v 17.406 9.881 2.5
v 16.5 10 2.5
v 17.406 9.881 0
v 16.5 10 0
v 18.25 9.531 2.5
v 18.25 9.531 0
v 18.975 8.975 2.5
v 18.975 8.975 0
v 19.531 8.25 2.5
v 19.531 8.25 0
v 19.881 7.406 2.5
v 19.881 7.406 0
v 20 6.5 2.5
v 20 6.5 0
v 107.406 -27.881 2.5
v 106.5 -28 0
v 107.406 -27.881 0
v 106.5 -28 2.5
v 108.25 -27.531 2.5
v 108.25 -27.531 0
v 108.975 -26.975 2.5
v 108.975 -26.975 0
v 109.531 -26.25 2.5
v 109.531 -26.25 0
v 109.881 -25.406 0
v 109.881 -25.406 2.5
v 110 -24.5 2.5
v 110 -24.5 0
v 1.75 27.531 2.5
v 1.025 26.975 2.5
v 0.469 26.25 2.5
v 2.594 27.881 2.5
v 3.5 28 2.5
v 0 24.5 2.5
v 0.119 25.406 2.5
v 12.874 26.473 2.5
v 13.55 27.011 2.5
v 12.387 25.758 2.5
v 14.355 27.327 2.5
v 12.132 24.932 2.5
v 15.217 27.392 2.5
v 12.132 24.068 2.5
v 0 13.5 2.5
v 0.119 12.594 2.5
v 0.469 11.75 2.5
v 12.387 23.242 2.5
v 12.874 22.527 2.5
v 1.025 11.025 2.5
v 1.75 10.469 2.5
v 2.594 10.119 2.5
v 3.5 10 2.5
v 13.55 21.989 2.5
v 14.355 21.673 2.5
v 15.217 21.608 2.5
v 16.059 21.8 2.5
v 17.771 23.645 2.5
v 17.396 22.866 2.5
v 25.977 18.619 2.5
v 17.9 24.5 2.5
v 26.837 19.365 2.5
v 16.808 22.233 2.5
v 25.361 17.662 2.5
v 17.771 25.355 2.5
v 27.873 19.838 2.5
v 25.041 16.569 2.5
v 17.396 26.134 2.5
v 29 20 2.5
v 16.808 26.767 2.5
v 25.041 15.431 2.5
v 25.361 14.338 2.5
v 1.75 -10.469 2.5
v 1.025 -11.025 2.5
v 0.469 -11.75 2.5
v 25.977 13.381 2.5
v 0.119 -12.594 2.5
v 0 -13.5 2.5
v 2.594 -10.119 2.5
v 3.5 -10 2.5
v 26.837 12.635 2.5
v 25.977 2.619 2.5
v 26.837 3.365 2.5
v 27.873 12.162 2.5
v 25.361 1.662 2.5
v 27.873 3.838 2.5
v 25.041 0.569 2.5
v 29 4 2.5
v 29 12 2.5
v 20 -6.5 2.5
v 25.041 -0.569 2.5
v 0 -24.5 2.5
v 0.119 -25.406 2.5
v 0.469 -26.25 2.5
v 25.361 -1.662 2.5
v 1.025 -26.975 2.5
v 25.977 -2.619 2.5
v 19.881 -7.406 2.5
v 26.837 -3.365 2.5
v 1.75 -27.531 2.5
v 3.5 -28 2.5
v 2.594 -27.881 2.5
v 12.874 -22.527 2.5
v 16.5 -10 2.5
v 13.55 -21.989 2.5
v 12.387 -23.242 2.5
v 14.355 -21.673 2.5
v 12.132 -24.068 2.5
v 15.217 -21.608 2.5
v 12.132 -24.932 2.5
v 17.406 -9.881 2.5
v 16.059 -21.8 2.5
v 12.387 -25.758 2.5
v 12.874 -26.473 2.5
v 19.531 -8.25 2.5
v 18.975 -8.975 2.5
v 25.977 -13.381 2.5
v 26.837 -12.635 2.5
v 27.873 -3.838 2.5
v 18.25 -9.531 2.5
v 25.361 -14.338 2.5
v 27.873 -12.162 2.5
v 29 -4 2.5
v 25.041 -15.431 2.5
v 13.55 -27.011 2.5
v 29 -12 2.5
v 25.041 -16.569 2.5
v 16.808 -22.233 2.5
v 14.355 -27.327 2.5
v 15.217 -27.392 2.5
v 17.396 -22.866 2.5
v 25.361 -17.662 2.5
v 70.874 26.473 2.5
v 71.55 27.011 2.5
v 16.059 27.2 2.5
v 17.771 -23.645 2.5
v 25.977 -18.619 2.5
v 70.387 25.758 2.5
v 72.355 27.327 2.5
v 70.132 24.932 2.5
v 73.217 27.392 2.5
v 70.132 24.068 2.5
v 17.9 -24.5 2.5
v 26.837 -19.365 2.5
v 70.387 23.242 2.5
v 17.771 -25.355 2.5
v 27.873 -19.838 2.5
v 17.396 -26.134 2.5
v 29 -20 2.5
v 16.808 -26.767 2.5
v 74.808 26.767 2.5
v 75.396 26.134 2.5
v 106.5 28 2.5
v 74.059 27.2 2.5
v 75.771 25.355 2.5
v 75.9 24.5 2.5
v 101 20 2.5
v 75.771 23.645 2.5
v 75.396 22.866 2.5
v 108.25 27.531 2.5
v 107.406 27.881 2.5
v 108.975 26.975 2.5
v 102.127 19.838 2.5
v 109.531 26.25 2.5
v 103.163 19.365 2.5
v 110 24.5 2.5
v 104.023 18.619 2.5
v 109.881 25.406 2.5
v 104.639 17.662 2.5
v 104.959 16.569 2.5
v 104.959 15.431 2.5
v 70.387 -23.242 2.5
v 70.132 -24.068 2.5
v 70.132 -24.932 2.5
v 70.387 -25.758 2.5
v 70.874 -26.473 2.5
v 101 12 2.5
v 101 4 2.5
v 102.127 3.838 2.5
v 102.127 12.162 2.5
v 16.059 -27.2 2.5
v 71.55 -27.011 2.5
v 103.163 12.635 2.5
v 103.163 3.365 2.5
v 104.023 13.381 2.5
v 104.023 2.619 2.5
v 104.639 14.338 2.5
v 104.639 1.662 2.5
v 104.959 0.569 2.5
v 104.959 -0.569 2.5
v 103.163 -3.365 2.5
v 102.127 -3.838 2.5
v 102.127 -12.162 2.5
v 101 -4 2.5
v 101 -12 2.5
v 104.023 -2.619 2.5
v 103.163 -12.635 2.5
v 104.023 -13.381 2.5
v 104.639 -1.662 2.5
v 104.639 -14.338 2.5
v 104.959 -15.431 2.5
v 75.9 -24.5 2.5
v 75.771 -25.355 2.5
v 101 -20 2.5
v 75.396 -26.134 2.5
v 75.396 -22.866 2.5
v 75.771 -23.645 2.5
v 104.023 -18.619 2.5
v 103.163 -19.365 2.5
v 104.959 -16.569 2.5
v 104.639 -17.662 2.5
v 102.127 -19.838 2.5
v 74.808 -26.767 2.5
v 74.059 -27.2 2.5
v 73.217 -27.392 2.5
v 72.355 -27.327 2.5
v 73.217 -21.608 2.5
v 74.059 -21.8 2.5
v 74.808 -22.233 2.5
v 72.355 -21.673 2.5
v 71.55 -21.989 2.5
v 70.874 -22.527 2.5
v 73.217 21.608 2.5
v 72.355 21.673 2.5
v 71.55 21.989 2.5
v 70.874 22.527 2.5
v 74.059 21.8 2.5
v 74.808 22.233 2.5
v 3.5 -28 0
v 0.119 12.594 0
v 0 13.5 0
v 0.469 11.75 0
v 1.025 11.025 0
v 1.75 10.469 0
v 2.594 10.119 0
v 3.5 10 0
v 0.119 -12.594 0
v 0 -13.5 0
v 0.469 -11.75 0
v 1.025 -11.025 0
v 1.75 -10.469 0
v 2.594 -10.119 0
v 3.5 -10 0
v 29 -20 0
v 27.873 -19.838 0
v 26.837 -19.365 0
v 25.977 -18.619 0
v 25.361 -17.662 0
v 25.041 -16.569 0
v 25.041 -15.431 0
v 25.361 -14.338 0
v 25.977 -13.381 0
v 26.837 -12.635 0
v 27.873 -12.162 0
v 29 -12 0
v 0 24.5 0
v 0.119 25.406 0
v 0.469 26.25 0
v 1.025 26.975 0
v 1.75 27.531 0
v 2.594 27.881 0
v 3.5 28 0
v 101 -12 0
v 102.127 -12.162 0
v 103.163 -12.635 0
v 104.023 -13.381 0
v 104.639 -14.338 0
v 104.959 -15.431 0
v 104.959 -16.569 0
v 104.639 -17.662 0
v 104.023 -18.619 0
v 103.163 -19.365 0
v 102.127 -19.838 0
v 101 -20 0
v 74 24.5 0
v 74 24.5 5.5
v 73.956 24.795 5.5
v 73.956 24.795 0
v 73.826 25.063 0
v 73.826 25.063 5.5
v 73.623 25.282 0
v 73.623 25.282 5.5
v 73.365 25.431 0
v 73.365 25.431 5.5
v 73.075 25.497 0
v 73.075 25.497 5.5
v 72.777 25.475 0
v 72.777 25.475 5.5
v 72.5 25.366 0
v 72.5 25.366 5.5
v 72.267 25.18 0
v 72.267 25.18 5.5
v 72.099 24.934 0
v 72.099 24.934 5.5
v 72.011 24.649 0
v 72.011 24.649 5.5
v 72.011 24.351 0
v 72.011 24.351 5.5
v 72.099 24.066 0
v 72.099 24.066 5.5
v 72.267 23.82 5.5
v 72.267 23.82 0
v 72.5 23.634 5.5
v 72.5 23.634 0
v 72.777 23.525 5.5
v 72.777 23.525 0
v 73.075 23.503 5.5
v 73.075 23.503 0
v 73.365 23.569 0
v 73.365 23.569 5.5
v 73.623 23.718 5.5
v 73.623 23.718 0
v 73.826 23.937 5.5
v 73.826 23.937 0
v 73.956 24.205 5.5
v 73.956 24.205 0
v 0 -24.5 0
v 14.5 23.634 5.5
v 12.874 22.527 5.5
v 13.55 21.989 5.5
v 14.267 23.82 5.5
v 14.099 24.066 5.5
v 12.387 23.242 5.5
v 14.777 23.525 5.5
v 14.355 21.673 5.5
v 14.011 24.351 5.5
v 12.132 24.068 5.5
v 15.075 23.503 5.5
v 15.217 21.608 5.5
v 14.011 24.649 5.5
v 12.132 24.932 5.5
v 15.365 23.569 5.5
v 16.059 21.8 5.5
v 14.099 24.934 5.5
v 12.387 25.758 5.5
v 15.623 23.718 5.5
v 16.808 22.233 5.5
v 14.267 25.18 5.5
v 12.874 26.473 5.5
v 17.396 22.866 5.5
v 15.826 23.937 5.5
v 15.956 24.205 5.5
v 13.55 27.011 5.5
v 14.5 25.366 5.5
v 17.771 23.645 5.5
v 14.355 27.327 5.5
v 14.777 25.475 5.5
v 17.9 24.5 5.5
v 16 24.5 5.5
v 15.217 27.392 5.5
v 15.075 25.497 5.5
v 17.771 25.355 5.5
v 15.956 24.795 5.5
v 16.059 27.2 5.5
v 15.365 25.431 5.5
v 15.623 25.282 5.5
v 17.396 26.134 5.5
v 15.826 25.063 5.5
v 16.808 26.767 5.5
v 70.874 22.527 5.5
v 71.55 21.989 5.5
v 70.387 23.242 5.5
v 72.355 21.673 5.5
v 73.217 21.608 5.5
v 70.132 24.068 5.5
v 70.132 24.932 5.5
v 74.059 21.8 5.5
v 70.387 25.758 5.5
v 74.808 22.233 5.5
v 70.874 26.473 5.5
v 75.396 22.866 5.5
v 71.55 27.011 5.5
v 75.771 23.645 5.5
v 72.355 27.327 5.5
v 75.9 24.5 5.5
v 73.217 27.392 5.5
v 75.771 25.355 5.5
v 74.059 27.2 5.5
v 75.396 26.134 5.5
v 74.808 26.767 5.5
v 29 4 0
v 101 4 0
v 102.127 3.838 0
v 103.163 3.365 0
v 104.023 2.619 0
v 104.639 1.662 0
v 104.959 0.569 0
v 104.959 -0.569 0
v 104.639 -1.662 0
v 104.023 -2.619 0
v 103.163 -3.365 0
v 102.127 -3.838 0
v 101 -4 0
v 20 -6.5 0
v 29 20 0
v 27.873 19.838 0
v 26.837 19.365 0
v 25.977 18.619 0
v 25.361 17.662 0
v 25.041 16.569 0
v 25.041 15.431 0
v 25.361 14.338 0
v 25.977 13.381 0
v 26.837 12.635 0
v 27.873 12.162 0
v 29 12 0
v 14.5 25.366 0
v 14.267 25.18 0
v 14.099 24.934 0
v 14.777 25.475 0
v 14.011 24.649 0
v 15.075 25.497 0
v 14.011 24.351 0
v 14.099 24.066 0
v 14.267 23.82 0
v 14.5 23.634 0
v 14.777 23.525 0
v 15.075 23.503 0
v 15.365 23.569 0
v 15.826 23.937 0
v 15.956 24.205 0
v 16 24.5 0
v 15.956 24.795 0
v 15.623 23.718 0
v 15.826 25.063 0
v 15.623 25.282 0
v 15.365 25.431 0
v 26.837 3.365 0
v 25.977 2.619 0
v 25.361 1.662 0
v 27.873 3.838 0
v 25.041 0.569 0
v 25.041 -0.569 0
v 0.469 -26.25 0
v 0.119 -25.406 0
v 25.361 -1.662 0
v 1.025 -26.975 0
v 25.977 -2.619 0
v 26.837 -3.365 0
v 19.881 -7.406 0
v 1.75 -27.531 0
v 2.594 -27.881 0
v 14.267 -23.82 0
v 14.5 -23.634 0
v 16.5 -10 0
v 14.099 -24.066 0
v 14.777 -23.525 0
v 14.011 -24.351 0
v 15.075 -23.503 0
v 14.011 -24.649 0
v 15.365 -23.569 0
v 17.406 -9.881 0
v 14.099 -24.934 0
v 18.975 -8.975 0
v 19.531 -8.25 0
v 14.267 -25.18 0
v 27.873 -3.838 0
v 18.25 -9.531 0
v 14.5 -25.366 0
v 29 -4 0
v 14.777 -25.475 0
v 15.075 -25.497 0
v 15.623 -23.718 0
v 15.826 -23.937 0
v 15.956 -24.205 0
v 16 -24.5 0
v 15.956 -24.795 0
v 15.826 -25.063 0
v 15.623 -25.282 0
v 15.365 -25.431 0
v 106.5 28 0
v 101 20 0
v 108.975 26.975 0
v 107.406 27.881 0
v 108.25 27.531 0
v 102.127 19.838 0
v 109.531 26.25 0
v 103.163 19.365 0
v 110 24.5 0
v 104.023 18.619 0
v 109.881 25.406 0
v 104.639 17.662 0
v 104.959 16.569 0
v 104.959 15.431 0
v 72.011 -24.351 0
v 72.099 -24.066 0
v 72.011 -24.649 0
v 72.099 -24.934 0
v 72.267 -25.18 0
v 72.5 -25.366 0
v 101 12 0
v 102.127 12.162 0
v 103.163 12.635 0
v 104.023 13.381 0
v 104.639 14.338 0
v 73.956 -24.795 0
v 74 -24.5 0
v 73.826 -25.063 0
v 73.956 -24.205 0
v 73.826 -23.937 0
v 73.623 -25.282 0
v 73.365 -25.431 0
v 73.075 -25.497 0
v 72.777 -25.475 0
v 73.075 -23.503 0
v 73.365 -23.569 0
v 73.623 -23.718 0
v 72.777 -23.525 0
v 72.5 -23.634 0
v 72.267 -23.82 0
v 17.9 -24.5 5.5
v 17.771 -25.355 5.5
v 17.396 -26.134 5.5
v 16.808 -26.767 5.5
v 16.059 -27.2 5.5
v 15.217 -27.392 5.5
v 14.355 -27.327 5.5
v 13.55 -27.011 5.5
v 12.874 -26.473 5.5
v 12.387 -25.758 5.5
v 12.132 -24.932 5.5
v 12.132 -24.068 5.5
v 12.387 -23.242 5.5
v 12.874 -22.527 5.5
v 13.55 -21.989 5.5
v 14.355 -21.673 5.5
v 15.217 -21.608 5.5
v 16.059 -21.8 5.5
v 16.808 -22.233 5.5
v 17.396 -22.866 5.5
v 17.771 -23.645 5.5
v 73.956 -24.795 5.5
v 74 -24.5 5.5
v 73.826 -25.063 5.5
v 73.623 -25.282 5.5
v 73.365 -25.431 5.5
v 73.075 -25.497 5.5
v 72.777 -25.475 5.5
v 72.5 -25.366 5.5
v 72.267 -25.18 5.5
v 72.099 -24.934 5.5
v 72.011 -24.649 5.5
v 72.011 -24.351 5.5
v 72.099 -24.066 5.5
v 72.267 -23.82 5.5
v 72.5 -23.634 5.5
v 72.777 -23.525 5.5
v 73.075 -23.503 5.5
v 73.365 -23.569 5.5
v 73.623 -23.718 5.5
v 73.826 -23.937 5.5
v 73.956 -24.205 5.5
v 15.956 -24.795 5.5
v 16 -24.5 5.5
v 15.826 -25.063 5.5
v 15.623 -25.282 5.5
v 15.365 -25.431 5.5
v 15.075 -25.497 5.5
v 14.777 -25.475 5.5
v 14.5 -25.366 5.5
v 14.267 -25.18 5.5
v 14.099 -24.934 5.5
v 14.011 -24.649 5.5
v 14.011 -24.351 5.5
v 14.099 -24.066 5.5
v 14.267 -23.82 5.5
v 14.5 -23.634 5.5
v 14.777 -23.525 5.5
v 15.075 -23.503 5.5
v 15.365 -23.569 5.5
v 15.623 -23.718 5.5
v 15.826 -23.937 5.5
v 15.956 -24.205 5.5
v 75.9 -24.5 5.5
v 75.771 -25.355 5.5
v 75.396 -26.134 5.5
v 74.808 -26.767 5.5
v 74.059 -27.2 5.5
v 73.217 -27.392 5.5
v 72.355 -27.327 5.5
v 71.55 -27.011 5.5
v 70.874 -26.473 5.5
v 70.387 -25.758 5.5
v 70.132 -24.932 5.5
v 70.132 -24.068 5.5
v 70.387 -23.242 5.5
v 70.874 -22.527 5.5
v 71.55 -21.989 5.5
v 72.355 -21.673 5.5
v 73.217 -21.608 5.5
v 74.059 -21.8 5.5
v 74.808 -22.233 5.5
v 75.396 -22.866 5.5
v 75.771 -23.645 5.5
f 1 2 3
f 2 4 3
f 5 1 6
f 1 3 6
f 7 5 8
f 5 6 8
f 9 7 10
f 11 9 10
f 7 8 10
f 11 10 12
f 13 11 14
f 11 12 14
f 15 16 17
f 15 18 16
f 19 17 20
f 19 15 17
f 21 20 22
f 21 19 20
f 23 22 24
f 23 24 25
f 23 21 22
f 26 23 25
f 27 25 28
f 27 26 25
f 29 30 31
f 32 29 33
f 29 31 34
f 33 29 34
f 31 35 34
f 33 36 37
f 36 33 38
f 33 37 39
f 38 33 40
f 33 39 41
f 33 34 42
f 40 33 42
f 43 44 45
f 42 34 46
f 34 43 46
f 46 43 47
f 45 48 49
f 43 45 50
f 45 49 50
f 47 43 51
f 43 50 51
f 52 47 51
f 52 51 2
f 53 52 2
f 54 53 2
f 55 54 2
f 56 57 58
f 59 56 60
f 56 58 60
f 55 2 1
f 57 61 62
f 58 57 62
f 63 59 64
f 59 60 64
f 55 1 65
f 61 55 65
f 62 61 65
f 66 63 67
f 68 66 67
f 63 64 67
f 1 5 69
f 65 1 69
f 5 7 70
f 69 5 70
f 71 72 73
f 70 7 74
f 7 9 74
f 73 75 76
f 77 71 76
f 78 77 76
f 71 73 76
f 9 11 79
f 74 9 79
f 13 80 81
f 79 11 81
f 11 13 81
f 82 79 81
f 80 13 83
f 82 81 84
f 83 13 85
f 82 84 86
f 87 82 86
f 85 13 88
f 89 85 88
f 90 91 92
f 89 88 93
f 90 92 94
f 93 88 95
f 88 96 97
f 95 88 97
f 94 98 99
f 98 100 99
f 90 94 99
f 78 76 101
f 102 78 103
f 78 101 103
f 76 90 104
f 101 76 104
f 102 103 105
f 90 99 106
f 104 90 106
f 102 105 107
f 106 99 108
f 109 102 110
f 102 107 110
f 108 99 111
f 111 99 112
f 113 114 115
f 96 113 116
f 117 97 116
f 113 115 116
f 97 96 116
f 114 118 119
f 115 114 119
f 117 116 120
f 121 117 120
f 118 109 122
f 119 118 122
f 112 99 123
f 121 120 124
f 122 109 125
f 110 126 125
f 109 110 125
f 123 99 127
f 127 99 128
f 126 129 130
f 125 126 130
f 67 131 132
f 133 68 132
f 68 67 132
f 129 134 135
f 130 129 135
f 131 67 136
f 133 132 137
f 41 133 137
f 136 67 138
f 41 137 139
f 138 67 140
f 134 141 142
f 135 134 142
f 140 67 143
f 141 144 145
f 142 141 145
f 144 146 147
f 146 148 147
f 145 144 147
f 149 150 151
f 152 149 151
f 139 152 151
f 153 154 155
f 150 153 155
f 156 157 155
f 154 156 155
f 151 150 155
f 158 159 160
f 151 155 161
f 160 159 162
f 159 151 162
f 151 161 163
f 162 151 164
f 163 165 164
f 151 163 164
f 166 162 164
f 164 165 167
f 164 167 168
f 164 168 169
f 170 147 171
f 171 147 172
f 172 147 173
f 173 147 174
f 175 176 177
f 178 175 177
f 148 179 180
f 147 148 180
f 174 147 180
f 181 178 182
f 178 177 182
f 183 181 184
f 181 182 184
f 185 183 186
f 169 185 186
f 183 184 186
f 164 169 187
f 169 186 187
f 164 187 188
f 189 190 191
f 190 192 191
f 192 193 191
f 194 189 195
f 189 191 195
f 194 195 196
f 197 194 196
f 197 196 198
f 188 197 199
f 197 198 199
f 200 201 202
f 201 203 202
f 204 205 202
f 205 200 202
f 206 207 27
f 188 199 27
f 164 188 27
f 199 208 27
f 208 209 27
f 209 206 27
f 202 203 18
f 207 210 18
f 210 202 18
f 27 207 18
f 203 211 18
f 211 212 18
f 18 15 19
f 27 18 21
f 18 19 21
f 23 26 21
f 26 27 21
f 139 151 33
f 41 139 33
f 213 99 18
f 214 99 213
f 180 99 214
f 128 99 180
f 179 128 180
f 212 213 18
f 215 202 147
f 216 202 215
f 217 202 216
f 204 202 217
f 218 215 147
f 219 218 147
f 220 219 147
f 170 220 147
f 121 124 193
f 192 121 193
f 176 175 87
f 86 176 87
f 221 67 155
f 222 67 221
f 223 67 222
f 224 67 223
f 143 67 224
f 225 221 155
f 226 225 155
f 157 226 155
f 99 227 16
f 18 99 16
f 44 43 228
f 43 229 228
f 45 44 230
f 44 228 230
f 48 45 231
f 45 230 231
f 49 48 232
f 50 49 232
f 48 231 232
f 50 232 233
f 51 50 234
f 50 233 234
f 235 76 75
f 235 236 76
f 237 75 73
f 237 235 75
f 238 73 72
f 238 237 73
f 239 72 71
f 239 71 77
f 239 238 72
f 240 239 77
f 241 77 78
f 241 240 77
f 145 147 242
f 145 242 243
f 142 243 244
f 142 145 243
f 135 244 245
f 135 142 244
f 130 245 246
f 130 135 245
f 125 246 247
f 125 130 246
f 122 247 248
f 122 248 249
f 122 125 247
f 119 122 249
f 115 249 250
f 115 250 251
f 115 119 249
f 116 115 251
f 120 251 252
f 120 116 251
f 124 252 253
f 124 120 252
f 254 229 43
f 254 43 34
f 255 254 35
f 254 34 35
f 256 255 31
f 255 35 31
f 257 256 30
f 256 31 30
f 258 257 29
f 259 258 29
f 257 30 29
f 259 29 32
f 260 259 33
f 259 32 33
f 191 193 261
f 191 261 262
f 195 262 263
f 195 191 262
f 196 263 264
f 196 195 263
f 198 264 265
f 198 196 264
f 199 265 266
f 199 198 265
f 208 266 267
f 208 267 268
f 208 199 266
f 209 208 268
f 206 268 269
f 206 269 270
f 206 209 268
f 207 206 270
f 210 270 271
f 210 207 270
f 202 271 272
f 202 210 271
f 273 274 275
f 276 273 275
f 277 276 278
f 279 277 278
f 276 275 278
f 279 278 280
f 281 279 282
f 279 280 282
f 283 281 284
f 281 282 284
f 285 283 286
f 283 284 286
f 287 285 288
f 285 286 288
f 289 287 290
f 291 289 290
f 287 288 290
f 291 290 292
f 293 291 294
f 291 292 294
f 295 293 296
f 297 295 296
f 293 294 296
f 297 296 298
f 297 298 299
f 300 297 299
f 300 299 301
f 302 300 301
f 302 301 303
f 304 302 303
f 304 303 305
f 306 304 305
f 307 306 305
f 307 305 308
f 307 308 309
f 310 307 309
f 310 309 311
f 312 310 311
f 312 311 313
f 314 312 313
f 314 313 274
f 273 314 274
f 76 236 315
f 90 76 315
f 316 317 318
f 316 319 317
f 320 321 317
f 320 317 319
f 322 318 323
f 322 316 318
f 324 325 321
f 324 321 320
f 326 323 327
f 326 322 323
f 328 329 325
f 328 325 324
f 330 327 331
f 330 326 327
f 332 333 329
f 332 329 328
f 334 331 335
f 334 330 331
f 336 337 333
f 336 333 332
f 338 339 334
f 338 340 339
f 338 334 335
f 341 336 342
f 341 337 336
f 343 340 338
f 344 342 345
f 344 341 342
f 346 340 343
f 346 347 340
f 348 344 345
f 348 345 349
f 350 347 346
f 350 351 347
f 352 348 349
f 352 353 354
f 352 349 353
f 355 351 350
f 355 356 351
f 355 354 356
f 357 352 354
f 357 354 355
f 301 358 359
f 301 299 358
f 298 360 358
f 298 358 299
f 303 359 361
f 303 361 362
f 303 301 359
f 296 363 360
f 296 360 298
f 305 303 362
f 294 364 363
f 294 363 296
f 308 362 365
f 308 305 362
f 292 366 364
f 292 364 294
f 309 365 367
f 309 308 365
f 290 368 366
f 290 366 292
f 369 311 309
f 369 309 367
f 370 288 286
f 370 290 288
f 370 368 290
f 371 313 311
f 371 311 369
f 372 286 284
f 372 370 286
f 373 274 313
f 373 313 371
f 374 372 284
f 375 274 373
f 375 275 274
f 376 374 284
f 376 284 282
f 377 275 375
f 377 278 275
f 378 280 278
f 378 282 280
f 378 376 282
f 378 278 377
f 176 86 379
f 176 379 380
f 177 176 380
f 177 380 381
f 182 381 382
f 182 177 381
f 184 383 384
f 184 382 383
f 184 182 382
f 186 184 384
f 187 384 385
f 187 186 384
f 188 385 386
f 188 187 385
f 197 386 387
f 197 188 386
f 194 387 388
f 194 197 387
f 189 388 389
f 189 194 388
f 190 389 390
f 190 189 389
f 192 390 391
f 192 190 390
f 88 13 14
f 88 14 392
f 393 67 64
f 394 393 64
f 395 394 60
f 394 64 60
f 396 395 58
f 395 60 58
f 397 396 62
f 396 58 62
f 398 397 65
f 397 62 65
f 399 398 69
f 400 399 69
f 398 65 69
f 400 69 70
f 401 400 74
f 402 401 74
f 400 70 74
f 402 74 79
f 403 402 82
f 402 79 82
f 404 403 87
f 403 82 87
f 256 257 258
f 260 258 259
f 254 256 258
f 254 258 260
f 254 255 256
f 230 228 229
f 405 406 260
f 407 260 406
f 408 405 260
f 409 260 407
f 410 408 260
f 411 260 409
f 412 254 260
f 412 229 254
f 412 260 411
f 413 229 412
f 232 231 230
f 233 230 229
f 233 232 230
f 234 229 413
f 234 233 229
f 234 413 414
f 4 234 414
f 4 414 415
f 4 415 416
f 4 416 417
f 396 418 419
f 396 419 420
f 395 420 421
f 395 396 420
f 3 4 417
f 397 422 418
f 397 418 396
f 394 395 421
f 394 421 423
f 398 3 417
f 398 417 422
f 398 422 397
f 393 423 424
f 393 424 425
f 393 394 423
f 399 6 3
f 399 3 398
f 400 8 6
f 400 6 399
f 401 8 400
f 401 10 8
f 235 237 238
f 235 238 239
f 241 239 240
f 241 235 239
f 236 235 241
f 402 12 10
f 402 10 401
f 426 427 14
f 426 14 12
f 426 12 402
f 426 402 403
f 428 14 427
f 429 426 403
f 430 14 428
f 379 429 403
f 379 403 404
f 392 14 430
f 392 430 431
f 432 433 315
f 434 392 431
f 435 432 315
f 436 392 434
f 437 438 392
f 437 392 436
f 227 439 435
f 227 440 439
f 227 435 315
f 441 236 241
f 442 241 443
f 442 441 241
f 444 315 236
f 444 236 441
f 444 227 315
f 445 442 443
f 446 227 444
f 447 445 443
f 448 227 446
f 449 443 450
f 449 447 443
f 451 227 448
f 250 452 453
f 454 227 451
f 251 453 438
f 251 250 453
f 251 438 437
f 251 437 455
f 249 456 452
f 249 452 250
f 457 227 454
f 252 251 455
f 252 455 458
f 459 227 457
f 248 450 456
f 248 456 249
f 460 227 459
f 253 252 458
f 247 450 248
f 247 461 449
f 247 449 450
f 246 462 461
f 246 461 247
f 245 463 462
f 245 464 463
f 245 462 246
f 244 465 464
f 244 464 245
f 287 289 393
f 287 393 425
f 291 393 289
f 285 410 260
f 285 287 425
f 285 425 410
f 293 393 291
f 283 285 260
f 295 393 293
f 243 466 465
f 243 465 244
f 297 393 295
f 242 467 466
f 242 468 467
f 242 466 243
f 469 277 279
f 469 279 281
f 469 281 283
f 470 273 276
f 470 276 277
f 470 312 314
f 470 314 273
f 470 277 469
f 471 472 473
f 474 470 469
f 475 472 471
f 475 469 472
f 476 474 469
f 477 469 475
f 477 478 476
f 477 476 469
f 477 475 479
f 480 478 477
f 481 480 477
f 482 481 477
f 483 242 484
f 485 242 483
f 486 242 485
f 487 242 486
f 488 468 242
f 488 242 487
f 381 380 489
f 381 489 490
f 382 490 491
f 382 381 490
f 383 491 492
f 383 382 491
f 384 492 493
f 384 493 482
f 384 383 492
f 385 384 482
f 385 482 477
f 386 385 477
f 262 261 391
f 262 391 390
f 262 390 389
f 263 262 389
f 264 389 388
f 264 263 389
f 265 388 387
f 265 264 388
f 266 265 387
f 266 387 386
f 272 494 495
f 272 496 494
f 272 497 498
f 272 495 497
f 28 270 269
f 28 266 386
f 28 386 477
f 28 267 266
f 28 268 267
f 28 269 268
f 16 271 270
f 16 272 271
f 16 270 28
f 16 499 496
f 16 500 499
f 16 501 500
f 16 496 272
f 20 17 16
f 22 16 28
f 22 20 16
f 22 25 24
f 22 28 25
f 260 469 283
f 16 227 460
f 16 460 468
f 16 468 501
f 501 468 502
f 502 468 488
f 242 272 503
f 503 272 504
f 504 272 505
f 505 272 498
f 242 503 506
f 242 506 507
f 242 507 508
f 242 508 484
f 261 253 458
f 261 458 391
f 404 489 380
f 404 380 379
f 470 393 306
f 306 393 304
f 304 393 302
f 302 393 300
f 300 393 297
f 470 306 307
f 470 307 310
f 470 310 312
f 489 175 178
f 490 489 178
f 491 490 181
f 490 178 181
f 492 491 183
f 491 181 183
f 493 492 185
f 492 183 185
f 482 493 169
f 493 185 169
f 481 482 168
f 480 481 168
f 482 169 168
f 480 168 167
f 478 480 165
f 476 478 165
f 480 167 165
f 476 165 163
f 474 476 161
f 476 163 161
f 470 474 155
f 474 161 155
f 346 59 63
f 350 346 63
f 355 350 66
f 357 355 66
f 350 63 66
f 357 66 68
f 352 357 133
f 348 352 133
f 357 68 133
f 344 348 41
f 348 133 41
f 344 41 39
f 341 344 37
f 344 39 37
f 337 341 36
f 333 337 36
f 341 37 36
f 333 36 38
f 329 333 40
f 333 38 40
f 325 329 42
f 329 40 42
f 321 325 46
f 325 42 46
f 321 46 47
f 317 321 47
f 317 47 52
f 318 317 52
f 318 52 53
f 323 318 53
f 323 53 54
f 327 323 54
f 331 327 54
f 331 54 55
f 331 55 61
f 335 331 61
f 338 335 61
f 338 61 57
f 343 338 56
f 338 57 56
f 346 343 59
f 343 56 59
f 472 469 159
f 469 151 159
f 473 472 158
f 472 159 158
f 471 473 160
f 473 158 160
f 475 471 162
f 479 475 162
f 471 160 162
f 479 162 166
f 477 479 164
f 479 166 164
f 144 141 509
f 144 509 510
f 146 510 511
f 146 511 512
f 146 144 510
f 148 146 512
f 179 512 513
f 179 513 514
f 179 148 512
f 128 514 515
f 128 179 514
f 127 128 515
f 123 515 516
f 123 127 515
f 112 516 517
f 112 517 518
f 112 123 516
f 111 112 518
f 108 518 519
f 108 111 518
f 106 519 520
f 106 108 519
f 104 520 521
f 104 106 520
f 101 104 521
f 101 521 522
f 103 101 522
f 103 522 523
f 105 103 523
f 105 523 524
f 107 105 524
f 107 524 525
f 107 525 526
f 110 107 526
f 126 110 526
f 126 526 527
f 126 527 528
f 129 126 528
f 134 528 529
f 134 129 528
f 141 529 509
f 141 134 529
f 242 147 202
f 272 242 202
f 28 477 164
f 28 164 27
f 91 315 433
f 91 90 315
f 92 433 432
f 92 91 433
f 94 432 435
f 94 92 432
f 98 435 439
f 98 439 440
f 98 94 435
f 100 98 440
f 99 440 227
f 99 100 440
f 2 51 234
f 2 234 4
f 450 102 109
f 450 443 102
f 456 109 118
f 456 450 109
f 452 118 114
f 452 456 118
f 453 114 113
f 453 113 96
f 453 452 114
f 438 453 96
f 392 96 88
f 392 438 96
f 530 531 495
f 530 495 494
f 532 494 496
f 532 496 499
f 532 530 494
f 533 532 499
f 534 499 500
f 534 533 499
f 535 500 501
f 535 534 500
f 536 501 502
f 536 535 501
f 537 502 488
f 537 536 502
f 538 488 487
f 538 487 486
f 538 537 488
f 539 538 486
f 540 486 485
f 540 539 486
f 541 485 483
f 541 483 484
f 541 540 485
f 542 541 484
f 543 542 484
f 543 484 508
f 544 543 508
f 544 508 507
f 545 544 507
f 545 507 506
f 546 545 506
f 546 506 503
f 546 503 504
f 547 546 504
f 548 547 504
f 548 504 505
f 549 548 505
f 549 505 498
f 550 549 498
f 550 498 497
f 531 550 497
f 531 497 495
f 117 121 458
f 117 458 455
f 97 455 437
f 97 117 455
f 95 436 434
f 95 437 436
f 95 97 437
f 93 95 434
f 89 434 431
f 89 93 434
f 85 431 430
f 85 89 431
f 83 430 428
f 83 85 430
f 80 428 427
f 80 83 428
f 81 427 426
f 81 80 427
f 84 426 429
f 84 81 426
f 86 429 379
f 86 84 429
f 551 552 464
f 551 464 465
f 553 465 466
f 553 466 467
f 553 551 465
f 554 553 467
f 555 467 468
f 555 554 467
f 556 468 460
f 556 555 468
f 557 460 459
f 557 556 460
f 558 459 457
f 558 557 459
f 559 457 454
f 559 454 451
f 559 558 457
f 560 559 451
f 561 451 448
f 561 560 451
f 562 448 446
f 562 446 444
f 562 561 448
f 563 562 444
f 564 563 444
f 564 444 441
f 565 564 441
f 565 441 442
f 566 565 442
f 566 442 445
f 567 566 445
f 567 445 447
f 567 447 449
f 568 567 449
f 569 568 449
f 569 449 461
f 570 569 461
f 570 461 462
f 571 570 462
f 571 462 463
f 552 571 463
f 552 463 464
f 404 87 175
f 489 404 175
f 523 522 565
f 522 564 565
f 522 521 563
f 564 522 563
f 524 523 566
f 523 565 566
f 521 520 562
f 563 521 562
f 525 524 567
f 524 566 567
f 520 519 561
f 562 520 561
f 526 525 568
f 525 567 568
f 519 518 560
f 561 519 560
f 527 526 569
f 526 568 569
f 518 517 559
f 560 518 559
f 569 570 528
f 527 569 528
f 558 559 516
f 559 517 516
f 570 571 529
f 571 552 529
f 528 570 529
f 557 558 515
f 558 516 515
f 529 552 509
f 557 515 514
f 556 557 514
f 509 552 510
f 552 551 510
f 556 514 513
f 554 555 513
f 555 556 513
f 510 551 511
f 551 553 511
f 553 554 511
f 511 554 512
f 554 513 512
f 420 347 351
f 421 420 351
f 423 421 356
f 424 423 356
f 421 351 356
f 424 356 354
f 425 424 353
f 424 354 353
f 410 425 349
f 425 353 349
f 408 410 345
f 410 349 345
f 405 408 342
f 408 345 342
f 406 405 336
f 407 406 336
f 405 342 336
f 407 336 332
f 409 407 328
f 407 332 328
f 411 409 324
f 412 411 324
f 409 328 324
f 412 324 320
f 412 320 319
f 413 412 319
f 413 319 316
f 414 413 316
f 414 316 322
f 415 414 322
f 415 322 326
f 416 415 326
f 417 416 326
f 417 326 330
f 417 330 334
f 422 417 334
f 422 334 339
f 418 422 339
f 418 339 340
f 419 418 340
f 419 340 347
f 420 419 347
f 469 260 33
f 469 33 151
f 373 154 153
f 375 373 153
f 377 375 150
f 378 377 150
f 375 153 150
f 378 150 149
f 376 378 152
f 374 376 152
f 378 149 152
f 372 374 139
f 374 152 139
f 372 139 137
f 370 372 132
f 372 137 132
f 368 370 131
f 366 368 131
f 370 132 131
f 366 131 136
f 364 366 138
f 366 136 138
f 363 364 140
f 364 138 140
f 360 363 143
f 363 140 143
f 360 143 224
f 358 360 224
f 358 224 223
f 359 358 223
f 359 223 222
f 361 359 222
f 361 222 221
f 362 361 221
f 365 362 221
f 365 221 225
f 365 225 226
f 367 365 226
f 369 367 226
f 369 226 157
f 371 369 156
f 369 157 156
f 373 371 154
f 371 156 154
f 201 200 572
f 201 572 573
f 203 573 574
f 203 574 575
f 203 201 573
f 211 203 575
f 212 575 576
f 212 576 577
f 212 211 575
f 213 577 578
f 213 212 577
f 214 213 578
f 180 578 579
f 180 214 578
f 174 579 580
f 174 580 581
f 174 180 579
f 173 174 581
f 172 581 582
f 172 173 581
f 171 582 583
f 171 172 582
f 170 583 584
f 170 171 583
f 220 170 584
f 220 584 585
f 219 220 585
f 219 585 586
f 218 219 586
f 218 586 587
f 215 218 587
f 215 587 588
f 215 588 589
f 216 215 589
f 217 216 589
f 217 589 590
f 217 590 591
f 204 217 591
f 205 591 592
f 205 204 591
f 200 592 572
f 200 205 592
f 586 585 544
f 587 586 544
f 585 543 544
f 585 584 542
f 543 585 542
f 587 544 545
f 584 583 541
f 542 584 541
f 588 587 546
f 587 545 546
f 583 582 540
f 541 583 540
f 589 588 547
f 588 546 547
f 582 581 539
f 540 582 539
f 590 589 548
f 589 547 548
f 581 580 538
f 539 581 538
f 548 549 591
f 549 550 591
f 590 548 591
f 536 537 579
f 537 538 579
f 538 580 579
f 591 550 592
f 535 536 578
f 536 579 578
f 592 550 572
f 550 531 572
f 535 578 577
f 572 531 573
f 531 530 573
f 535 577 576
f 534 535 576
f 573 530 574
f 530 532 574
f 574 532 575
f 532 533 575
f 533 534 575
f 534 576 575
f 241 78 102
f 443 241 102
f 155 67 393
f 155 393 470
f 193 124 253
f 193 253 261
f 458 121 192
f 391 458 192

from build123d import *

# Parameters (mm, degrees)
SKETCH_W            = 110
SKETCH_H            = 28
PAD_DEPTH           = 2.5
SKETCH001_R         = 2.9
PAD001_DEPTH        = 3
SKETCH002_R         = 1
POCKET_DEPTH        = 5.501
POCKET001_DEPTH     = 2.501
LINEARPATTERN_COUNT = 2
LINEARPATTERN_PITCH = 16
SKETCH004_W         = 20
SKETCH004_H         = 10
POCKET002_DEPTH     = 2.501
FILLET_R            = 3.5


with BuildPart() as part:
    # Sketch → Pad (new body)
    with BuildSketch(Plane.XY):
        with Locations((55, 14)):
            Rectangle(SKETCH_W, SKETCH_H)
    extrude(amount=PAD_DEPTH)

    # Sketch001 (on Face6 of Pad) → Pad001 (join)
    with BuildSketch(Plane.XY.offset(2.5)):
        with Locations((15, 24.5)):
            Circle(SKETCH001_R)
        with Locations((73, 24.5)):
            Circle(SKETCH001_R)
    extrude(amount=PAD001_DEPTH)

    # Sketch002 (on Face9 of Pad001) → Pocket (cut, through all)
    with BuildSketch(Plane.XY.offset(5.5)):
        with Locations((15, 24.5)):
            Circle(SKETCH002_R)
        with Locations((73, 24.5)):
            Circle(SKETCH002_R)
    extrude(amount=-POCKET_DEPTH, mode=Mode.SUBTRACT)

    # Sketch003 (on Face5 of Pocket) → Pocket001 (cut, through all)
    with BuildSketch(Plane.XY.offset(2.5)):
        with BuildLine():
            ThreePointArc((29, 4), (25, 0), (29, -4))
            Line((29, -4), (101, -4))
            ThreePointArc((101, -4), (105, 0), (101, 4))
            Line((29, 4), (101, 4))
        make_face()
    pocket001 = extrude(amount=-POCKET001_DEPTH, mode=Mode.SUBTRACT)

    # LinearPattern: Pocket001 ×2
    with Locations(*[(0, i * LINEARPATTERN_PITCH, 0) for i in range(1, LINEARPATTERN_COUNT)]):
        add(pocket001, mode=Mode.SUBTRACT)

    # Sketch004 (on Face4 of LinearPattern) → Pocket002 (cut, through all)
    with BuildSketch(Plane.XY.offset(2.5)):
        with Locations((10, 5)):
            Rectangle(SKETCH004_W, SKETCH004_H)
    extrude(amount=-POCKET002_DEPTH, mode=Mode.SUBTRACT)

    # Fillet
    fillet_edges = [part.edges().sort_by_distance(p)[0] for p in [
        (20, 10, 1.25),
        (0, 10, 1.25),
        (0, 28, 1.25),
        (110, 28, 1.25),
    ]]
    fillet(fillet_edges, radius=FILLET_R)

    # Mirrored: part across XZ


with BuildPart() as part_1:
    add(part.part)
    add(part.part.mirror(Plane.XZ))


solid = part_1.part
